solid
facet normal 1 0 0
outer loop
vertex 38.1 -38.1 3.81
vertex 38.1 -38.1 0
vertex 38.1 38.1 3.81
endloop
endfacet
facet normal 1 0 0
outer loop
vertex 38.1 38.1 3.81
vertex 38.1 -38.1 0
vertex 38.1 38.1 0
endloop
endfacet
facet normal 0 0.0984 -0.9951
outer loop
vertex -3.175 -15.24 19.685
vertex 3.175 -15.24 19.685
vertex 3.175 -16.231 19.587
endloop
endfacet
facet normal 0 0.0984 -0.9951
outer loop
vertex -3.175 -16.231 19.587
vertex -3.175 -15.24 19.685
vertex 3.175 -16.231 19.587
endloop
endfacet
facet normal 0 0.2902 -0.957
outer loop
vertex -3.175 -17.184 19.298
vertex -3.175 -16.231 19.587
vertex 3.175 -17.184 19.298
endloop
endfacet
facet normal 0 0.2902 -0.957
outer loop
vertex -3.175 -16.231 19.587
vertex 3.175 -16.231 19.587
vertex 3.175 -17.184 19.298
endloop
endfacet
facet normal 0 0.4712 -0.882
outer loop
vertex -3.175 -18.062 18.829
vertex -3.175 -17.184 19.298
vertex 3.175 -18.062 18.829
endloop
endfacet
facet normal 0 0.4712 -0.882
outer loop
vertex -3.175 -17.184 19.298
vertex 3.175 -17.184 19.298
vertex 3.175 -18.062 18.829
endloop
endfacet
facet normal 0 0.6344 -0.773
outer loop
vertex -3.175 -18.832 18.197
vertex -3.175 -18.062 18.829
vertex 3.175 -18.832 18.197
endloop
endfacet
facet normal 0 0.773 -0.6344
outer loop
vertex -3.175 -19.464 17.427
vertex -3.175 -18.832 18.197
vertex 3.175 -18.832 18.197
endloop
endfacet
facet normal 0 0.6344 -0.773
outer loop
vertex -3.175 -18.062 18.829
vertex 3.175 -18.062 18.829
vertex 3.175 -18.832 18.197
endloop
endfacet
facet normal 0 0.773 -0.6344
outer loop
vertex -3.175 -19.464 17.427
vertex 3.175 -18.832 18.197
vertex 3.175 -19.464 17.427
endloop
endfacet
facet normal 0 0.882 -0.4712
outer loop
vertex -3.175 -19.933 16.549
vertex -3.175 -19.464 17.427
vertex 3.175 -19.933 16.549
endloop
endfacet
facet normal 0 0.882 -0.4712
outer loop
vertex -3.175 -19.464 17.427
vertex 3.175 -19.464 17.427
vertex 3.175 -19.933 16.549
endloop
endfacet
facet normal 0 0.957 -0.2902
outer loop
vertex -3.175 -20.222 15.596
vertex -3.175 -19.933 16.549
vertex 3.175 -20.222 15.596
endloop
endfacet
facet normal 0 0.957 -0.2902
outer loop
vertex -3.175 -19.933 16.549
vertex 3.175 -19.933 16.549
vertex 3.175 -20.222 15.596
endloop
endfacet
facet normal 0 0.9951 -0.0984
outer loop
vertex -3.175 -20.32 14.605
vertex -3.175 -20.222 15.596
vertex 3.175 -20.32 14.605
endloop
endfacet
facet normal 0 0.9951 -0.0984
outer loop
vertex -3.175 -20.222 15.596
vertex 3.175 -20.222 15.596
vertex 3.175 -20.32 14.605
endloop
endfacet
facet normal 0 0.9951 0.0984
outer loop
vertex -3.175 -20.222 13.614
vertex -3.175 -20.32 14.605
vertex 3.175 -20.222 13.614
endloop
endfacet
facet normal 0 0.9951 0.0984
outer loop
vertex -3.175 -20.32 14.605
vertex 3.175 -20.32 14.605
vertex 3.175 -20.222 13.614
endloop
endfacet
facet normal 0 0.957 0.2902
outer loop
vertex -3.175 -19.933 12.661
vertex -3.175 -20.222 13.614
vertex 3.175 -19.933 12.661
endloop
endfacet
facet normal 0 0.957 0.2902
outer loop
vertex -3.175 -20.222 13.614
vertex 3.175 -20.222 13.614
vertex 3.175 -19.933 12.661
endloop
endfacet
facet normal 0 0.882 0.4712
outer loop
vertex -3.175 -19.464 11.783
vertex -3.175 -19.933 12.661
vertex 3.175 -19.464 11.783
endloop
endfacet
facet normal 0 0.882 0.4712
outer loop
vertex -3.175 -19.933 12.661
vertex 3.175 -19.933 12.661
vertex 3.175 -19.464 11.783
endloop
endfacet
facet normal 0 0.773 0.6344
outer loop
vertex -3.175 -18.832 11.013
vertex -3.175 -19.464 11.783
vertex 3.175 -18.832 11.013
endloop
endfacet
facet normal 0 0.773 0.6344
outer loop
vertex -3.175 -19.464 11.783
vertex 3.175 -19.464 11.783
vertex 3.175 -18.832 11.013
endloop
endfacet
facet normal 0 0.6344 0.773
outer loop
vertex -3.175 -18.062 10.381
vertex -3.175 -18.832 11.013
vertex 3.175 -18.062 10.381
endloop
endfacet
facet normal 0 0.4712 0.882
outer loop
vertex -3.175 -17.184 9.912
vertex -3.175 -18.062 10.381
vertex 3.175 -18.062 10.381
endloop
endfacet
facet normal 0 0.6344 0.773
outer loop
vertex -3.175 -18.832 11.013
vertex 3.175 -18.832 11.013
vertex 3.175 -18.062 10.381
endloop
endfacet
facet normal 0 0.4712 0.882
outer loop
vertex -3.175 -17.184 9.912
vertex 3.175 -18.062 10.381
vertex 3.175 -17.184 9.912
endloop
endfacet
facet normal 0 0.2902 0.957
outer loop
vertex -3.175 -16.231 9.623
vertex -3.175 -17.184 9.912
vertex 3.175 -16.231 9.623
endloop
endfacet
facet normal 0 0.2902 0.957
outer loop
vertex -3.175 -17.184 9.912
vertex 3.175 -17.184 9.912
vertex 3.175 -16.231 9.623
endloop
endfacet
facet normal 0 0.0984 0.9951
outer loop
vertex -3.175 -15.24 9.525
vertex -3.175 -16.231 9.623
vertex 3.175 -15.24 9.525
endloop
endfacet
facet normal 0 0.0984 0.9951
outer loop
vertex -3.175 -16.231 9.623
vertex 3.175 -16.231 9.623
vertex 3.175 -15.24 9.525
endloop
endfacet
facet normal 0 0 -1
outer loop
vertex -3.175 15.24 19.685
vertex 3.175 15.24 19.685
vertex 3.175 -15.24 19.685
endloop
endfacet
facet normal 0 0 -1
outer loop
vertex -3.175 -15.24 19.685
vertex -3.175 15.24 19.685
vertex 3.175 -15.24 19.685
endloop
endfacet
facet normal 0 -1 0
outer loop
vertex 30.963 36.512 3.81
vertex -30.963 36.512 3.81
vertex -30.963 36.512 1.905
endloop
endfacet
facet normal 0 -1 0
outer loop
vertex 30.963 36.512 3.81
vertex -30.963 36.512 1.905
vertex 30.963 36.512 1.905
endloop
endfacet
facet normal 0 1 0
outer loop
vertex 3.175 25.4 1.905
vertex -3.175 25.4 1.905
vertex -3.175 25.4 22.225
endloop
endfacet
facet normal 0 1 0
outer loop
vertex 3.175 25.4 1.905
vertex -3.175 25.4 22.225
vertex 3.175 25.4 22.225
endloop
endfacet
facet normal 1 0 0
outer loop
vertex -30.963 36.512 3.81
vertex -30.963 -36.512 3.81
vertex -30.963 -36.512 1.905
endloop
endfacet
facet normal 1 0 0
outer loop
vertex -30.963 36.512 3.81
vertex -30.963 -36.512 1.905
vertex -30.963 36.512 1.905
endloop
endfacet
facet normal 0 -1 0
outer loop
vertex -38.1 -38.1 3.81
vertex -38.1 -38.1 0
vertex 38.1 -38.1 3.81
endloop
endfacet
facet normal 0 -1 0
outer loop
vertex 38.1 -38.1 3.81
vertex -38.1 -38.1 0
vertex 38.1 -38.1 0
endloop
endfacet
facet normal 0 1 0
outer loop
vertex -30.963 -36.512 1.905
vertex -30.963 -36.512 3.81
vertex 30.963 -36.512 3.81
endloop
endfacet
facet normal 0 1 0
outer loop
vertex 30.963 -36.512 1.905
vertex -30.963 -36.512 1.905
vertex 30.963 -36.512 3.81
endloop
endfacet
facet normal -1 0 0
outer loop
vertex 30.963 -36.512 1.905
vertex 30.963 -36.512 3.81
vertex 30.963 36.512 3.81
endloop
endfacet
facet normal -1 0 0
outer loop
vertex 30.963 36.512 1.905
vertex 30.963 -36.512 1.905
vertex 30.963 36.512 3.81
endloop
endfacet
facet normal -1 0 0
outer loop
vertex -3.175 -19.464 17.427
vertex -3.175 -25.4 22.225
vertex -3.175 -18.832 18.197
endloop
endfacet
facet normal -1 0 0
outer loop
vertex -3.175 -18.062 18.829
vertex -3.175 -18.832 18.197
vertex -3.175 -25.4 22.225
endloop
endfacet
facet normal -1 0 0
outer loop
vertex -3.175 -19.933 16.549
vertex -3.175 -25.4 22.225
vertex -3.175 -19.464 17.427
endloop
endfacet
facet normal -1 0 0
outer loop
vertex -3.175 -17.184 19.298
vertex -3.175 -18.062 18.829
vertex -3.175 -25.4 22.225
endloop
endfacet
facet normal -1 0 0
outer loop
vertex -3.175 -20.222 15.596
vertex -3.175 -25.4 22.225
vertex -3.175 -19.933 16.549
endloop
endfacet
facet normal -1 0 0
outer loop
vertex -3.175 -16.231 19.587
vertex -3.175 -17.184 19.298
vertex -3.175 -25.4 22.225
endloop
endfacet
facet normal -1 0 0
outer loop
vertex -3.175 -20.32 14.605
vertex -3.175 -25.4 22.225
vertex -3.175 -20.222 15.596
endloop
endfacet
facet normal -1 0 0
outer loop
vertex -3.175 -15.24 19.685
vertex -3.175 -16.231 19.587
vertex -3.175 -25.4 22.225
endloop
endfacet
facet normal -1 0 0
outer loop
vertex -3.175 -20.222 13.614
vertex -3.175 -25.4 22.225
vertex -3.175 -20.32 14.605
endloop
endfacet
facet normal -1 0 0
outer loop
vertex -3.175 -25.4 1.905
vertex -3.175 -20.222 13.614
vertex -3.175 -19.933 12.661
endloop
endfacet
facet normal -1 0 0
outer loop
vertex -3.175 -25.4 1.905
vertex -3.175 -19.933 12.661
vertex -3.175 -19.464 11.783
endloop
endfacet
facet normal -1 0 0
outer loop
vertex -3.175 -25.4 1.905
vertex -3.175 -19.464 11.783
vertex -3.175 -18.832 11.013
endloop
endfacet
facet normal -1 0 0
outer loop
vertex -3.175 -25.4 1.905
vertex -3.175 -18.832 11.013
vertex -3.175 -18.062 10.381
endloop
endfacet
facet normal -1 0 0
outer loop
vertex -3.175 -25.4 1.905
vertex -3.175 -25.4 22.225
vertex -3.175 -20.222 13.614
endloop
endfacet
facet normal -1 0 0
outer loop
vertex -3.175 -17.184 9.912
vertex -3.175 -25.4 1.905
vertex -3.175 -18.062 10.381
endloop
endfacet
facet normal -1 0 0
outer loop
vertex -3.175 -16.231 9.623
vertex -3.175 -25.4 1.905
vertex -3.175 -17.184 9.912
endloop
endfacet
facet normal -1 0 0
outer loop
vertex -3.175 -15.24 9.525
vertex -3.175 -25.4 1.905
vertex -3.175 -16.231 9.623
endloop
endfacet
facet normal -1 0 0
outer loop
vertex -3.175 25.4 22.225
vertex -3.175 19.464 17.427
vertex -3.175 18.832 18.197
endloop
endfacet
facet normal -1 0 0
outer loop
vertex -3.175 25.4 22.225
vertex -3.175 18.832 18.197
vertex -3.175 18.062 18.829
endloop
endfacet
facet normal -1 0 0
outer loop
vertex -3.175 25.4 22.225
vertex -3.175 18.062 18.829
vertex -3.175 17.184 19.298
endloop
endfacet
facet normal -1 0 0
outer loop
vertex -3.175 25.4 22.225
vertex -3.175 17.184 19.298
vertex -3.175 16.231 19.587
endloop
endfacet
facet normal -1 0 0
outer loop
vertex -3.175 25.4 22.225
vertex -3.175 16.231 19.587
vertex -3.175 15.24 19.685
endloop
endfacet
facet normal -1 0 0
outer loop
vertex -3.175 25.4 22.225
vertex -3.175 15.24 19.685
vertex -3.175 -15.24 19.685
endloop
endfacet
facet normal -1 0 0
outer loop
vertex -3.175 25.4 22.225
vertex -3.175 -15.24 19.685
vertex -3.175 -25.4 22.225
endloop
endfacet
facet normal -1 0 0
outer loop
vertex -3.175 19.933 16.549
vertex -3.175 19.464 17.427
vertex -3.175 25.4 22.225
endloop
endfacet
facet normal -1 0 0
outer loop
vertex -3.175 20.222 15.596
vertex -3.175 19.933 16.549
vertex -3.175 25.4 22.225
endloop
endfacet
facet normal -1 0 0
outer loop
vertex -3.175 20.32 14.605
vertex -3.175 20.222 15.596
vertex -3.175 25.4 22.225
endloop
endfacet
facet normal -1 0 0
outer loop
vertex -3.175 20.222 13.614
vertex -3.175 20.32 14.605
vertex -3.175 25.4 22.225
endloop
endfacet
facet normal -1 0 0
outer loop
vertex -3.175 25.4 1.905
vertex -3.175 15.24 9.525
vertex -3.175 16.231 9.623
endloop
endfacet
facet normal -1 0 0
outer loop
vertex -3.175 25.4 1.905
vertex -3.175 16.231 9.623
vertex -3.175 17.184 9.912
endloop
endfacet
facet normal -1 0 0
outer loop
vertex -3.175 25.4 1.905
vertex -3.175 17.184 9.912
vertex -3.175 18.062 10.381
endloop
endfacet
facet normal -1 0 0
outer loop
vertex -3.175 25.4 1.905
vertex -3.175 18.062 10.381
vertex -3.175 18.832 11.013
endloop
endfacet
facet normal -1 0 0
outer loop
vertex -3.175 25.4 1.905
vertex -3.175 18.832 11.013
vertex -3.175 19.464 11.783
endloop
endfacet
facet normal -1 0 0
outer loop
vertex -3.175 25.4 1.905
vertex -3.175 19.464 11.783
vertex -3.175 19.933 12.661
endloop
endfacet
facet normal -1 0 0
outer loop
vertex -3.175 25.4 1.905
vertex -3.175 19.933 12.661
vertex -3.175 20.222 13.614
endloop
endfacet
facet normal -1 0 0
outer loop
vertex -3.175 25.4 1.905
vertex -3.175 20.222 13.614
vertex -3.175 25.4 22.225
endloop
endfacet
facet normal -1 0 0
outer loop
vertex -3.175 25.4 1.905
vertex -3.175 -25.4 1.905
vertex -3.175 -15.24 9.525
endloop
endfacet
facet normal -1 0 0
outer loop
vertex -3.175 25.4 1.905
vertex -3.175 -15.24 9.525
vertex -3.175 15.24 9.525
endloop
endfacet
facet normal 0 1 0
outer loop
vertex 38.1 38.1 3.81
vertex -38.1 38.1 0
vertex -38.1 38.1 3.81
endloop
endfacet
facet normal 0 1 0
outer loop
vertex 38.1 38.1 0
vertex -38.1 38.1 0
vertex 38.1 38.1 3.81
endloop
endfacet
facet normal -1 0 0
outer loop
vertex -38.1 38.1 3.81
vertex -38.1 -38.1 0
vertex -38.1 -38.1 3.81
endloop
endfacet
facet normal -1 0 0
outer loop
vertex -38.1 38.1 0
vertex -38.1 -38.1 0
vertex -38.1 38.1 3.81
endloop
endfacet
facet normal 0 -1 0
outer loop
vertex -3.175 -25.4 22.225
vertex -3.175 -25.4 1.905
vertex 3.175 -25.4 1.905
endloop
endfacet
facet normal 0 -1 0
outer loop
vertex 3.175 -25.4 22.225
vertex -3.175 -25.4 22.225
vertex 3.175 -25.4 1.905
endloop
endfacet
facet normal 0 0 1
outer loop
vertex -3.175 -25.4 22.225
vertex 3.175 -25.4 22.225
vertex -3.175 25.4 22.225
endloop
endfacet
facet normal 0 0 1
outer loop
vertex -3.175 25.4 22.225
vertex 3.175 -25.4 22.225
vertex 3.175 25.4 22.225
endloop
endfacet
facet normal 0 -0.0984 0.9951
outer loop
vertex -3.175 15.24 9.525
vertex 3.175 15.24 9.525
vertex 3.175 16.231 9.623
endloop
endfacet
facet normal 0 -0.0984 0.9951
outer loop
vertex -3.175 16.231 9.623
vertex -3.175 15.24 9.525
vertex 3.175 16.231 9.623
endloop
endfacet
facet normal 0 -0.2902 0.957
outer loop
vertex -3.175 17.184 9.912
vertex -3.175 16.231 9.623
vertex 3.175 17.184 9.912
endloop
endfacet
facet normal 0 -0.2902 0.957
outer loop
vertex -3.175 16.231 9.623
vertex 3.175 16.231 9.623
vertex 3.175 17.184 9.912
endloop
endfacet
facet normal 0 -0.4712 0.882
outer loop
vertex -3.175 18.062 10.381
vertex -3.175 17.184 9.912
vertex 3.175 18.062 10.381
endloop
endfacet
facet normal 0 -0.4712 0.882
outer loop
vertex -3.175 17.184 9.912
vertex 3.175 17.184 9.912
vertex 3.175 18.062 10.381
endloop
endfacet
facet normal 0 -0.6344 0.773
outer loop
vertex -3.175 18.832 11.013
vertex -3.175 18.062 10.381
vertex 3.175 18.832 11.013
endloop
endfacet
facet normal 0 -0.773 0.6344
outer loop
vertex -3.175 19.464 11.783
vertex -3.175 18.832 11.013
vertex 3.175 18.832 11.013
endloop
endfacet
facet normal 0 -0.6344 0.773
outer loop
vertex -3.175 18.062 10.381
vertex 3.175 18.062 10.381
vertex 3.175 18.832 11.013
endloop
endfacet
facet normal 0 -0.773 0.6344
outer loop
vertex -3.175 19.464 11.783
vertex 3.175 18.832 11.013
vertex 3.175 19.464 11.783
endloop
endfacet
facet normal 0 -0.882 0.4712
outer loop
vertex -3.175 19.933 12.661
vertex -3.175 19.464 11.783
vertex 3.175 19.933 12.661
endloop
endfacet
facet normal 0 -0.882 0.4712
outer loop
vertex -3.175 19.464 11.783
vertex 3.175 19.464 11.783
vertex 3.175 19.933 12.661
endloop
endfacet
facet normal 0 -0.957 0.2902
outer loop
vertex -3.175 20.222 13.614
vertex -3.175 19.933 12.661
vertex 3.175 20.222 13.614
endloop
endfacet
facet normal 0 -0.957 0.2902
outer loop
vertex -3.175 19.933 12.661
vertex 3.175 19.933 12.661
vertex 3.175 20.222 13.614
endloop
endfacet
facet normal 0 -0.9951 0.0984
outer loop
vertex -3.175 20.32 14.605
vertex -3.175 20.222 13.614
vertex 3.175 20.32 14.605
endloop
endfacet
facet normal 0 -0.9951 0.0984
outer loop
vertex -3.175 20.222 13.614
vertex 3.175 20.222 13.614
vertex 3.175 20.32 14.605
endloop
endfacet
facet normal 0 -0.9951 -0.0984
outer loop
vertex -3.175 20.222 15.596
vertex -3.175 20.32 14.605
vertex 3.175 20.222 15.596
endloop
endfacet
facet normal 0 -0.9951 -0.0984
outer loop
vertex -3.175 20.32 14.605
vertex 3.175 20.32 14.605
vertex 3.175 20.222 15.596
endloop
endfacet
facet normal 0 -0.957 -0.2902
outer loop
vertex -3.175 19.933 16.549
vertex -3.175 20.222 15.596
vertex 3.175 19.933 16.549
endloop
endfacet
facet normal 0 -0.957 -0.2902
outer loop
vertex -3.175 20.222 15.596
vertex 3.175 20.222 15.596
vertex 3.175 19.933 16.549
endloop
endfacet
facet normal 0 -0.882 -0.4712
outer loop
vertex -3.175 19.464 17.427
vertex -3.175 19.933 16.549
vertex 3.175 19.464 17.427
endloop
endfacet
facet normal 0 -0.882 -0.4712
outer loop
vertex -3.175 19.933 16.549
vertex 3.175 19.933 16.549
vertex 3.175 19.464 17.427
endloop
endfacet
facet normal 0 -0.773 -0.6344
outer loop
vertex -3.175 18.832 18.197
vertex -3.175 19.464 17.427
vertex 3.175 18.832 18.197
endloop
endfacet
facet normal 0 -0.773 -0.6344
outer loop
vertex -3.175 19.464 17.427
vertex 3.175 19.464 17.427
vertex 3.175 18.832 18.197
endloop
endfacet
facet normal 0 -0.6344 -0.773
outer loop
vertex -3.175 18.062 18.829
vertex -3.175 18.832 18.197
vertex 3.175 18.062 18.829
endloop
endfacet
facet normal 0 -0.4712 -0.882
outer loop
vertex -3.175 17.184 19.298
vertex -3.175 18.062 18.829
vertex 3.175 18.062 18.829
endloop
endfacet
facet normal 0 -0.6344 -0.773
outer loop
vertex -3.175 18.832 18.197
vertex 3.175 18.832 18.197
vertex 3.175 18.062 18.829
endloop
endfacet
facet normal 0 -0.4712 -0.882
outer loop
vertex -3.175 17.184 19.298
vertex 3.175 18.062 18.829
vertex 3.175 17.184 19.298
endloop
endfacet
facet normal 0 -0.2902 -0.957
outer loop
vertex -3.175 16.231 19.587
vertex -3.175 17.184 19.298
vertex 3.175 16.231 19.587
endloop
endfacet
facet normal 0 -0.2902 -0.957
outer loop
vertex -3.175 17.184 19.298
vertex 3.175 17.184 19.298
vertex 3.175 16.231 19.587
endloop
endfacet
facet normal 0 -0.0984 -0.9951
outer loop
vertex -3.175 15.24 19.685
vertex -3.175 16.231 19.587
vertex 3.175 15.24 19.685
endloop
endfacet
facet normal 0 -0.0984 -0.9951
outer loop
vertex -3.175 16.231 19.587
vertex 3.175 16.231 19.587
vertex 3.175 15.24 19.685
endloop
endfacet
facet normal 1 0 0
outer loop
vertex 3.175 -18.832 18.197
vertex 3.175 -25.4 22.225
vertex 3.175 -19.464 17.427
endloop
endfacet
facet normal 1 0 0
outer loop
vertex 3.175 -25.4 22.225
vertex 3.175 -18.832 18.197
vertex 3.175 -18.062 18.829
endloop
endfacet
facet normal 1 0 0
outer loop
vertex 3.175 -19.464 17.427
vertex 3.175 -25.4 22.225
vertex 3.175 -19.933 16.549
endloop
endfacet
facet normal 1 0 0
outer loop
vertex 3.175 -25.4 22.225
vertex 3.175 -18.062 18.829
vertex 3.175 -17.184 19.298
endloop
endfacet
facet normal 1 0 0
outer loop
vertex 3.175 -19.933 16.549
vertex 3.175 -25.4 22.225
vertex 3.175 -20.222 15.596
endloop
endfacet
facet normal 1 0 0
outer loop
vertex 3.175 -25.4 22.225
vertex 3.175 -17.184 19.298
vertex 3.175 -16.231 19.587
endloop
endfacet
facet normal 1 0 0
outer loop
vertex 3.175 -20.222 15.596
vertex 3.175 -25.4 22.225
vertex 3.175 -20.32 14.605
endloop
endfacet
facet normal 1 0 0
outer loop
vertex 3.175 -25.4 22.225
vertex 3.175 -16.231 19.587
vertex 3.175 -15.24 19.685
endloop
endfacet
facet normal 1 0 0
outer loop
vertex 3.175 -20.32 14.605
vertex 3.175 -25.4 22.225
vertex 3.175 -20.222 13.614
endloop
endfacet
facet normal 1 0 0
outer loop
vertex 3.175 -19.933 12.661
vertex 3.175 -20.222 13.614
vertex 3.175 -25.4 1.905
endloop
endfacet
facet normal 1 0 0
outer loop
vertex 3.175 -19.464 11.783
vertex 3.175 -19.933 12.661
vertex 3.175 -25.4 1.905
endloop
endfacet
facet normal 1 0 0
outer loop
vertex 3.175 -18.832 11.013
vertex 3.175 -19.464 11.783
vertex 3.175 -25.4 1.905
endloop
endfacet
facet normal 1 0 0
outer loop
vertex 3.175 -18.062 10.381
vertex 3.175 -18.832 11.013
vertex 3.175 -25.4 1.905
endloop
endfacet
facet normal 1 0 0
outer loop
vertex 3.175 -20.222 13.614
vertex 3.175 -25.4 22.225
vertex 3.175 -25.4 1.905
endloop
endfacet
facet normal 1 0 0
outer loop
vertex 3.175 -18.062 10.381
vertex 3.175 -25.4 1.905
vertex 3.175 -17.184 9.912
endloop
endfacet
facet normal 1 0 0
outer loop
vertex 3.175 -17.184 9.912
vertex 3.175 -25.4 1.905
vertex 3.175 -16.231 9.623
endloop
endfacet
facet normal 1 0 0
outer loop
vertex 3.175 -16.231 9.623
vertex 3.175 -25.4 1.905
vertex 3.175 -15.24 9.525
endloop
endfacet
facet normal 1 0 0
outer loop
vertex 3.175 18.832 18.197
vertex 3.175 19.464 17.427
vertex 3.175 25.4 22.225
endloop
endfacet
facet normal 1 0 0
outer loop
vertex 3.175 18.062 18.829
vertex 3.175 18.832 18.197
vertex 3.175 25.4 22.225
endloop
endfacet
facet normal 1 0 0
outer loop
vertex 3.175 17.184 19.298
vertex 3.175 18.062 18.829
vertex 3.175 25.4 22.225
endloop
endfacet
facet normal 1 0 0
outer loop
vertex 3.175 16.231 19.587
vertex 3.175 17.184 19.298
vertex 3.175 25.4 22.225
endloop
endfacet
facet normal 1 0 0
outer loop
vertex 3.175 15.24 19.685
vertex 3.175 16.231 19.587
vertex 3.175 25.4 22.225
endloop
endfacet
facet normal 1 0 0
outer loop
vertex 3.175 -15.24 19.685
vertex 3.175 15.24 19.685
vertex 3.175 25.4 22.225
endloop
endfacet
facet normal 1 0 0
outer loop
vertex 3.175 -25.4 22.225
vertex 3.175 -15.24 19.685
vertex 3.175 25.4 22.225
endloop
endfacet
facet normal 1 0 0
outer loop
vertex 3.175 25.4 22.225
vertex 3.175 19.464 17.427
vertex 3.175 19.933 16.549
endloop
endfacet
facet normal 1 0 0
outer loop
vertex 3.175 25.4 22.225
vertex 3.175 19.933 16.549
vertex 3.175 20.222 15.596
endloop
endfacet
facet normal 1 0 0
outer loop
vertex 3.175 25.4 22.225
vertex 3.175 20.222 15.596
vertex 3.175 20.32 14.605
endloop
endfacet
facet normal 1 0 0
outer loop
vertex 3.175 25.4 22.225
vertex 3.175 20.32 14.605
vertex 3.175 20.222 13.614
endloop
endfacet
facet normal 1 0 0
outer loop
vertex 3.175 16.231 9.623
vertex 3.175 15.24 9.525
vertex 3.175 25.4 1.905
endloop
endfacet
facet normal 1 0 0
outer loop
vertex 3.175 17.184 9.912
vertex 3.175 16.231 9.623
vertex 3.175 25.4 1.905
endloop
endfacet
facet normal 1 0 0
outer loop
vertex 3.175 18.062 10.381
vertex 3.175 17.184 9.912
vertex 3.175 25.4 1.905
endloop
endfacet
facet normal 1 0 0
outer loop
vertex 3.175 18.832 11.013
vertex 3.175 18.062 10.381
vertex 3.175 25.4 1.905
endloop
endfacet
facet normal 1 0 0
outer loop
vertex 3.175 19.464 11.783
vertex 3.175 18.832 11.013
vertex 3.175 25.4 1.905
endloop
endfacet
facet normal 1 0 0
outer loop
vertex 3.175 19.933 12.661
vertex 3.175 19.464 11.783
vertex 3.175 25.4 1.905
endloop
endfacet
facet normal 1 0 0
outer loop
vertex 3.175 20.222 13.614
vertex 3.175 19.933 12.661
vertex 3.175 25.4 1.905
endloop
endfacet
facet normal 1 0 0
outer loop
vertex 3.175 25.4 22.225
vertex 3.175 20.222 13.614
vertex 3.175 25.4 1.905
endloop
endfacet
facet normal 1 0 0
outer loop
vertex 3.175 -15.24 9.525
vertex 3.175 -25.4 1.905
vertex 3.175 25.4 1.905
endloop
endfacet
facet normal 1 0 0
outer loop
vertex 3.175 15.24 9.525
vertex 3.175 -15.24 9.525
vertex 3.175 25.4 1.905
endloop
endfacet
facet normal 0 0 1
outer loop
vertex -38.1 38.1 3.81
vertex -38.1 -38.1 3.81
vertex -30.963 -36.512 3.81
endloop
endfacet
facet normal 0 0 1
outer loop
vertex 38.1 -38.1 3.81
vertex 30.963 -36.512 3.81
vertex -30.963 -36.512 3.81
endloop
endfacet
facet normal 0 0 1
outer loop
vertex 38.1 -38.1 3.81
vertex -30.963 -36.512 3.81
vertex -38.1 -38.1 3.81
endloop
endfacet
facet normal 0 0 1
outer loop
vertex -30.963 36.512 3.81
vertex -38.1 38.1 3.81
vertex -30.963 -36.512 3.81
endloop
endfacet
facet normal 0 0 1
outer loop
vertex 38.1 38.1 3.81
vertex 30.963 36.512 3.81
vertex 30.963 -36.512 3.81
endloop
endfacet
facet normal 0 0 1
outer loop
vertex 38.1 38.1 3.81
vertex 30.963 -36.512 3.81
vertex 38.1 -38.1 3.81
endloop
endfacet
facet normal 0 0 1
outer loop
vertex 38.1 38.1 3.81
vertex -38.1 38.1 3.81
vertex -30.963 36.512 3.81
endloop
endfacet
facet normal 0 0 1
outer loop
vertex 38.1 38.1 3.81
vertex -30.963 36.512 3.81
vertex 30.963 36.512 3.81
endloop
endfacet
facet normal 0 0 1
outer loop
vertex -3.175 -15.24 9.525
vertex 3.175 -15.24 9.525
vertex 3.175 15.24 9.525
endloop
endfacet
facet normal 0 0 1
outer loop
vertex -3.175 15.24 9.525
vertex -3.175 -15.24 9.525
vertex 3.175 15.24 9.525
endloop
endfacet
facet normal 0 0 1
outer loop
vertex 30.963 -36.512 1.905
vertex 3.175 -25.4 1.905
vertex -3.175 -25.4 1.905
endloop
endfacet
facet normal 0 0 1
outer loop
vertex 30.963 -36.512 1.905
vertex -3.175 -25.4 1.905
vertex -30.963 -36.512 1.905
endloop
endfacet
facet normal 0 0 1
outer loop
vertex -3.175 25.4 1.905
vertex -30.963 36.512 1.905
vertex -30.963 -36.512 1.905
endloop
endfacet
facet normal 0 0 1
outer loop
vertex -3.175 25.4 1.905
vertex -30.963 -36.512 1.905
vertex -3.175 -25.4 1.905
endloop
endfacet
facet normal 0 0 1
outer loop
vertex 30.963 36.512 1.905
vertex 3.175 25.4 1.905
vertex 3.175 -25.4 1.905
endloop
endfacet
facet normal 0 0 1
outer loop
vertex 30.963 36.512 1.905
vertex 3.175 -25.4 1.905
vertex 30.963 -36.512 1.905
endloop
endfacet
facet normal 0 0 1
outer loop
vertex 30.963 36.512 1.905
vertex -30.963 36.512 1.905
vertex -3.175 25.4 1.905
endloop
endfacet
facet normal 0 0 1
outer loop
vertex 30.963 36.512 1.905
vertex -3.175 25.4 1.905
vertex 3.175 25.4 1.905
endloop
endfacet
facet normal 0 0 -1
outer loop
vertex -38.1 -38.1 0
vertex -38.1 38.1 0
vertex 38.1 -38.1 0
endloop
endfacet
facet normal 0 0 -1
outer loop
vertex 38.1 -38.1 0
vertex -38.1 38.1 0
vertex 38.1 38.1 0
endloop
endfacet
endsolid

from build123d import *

# Parameters (mm, degrees)
F0_W     = 76.2
F0_H     = 76.2
F1_DEPTH = 3.81
F2_W     = 61.9252
F2_H     = 73.025
F3_DEPTH = 1.905
F4_W     = 6.35
F4_H     = 50.8
F5_DEPTH = 25.4
F7_DEPTH = 25.4
F8_W     = 50.8
F8_H     = 5.08
F9_DEPTH = 25.4


with BuildPart() as f1:
    # F0 (on Top) → F1 (new body)
    with BuildSketch(Plane.XY):
        Rectangle(F0_W, F0_H)
    extrude(amount=F1_DEPTH)

    # F2 (on face) → F3 (cut)
    with BuildSketch(Plane.XY.offset(3.81)):
        Rectangle(F2_W, F2_H)
    extrude(amount=-F3_DEPTH, mode=Mode.SUBTRACT)

    # F4 (on face) → F5 (join)
    with BuildSketch(Plane.XY.offset(1.905)):
        Rectangle(F4_W, F4_H)
    extrude(amount=F5_DEPTH)

    # F6 (on face) → F7 (cut)
    with BuildSketch(Plane.YZ.offset(3.175)):
        with BuildLine():
            ThreePointArc((15.24, 9.525), (20.32, 14.605), (15.24, 19.685))
            Line((15.24, 19.685), (-15.24, 19.685))
            ThreePointArc((-15.24, 19.685), (-20.32, 14.605), (-15.24, 9.525))
            Line((-15.24, 9.525), (15.24, 9.525))
        make_face()
    extrude(amount=-F7_DEPTH, mode=Mode.SUBTRACT)

    # F8 (on face) → F9 (cut)
    with BuildSketch(Plane.YZ.offset(3.175)):
        with Locations((0, 24.765)):
            Rectangle(F8_W, F8_H)
    extrude(amount=-F9_DEPTH, mode=Mode.SUBTRACT)


solid = f1.part
